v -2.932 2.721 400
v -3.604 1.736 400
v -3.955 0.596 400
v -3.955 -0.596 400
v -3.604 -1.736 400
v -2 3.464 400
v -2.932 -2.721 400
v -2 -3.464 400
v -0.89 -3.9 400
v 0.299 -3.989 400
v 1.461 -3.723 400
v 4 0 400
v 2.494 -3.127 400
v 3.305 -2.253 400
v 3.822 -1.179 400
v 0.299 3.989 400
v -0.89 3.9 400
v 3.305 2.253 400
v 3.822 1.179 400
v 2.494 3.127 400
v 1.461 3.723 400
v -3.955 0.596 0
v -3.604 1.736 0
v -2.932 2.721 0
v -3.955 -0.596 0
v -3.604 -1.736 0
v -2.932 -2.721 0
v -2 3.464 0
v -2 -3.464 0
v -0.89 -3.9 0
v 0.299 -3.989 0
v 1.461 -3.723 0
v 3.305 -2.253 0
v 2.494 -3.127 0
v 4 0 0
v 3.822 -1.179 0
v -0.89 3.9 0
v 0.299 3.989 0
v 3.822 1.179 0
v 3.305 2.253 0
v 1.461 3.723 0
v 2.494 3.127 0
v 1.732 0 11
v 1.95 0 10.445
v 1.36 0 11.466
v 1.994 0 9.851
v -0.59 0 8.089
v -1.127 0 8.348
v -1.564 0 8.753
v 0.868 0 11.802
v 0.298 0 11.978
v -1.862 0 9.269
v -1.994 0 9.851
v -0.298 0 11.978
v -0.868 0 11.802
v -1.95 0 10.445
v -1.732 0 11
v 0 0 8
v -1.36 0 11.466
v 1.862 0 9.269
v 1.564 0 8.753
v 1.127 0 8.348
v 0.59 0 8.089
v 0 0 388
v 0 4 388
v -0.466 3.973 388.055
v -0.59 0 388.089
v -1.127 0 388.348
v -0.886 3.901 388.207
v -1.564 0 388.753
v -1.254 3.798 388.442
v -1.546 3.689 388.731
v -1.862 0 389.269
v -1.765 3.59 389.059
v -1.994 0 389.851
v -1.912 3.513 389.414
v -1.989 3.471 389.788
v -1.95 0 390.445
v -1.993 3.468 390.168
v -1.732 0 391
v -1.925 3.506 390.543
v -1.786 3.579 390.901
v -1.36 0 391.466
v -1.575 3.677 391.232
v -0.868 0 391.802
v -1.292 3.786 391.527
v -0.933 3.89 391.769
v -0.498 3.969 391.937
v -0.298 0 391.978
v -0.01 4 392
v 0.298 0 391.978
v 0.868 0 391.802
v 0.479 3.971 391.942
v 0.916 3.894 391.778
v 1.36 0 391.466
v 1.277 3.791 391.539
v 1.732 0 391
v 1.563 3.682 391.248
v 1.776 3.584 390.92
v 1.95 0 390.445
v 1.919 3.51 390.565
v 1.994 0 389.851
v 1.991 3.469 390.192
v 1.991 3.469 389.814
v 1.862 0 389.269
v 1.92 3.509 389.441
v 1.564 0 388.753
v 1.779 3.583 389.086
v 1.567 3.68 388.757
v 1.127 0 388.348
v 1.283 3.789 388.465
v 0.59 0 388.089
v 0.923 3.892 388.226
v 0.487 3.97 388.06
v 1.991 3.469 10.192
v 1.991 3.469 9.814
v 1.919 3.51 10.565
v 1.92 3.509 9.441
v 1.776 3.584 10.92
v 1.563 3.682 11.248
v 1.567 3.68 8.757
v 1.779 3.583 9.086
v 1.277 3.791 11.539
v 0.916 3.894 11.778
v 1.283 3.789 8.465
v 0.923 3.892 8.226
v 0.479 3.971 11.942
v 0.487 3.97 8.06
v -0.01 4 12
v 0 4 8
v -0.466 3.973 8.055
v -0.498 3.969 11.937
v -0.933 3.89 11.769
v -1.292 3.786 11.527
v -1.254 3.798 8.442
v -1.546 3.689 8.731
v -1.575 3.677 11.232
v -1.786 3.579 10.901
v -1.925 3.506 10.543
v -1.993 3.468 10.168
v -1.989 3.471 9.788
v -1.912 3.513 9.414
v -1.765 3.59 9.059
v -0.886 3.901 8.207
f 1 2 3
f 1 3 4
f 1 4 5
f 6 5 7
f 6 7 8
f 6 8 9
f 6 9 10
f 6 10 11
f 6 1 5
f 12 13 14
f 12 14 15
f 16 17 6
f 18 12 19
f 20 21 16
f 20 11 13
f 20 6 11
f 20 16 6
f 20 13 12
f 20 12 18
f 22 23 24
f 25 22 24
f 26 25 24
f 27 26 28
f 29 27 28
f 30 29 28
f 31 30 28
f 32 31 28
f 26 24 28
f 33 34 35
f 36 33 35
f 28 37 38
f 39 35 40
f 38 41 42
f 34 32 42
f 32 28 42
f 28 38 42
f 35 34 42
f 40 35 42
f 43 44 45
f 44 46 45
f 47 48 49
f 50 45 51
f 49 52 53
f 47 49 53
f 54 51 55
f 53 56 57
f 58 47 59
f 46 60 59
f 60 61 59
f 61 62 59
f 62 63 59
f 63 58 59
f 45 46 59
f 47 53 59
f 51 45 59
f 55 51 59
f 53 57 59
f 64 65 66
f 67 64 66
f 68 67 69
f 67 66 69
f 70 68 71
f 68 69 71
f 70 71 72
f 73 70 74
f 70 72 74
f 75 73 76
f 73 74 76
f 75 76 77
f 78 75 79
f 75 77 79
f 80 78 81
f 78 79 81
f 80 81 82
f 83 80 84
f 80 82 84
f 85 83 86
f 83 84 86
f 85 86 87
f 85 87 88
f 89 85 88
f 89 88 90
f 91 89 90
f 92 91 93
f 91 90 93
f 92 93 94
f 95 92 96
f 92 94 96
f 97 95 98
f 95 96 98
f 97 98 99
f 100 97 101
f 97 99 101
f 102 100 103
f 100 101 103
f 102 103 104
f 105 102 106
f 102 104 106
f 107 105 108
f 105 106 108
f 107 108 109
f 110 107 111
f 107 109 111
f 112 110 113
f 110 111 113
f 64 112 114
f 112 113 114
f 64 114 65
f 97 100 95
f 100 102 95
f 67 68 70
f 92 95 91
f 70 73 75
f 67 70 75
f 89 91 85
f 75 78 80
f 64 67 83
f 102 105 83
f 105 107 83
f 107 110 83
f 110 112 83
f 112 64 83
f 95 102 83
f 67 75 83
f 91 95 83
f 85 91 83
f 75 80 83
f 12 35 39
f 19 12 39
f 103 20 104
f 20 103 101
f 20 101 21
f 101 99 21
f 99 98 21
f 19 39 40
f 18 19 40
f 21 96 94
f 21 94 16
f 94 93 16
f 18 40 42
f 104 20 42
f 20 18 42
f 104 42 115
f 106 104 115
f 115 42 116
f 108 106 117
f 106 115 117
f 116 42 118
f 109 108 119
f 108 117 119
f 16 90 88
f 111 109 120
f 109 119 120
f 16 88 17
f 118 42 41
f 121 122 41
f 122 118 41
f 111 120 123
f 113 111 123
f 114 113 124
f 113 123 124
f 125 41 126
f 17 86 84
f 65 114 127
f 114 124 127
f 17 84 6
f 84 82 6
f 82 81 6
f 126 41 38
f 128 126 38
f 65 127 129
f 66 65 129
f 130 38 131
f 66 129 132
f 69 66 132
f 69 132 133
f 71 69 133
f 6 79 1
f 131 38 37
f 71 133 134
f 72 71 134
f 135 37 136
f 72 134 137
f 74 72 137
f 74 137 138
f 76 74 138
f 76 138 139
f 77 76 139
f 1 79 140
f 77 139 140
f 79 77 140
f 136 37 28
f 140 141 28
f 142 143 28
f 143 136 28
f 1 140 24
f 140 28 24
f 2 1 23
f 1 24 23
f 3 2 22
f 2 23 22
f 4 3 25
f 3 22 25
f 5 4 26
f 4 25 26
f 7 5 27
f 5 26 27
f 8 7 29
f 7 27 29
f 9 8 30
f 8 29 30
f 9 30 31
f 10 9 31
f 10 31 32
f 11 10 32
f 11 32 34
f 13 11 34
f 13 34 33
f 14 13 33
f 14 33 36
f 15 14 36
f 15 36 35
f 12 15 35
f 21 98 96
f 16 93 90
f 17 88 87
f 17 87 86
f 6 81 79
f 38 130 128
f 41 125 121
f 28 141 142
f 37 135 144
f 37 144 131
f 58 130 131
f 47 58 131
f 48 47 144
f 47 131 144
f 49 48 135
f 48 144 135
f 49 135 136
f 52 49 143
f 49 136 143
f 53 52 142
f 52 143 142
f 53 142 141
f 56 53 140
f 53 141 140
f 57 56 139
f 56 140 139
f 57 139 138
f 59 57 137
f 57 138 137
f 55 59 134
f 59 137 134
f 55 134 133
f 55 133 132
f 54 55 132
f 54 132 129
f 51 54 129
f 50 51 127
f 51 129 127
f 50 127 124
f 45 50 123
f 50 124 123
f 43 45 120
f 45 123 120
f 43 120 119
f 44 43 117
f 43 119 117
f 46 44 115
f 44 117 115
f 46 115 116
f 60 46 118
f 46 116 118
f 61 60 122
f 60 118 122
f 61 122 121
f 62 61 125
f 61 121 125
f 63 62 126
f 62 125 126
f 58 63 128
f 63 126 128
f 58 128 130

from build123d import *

# Parameters (mm, degrees)
SKETCH1_R                         = 4
EXTRUDE1_DEPTH                    = 400
SKETCH3_W                         = 2
SKETCH3_H                         = 4
F_4_0_4_DIAMETER_HOLE1_AT_2_COUNT = 2
F_4_0_4_DIAMETER_HOLE1_AT_2_PITCH = 380


with BuildPart() as part:
    # Sketch1 → Extrude1 (new body)
    with BuildSketch(Plane.XY):
        Circle(SKETCH1_R)
    extrude(amount=EXTRUDE1_DEPTH)

    # Sketch3 → Ø4.0 (4) Diameter Hole1 (revolve, cut)
    with BuildSketch(Plane(origin=(0, 0, 10), x_dir=(0, 0, -1), z_dir=(1, 0, 0))):
        with Locations((1, 2)):
            Rectangle(SKETCH3_W, SKETCH3_H)
    f_4_0_4_diameter_hole1 = revolve(axis=Axis((0, -6.35, 10), (0, 1, 0)), mode=Mode.SUBTRACT)

    # Ø4.0 (4) Diameter Hole1 at 2: Ø4.0 (4) Diameter Hole1 ×2
    with Locations(*[(0, 0, i * F_4_0_4_DIAMETER_HOLE1_AT_2_PITCH) for i in range(1, F_4_0_4_DIAMETER_HOLE1_AT_2_COUNT)]):
        add(f_4_0_4_diameter_hole1, mode=Mode.SUBTRACT)


solid = part.part
